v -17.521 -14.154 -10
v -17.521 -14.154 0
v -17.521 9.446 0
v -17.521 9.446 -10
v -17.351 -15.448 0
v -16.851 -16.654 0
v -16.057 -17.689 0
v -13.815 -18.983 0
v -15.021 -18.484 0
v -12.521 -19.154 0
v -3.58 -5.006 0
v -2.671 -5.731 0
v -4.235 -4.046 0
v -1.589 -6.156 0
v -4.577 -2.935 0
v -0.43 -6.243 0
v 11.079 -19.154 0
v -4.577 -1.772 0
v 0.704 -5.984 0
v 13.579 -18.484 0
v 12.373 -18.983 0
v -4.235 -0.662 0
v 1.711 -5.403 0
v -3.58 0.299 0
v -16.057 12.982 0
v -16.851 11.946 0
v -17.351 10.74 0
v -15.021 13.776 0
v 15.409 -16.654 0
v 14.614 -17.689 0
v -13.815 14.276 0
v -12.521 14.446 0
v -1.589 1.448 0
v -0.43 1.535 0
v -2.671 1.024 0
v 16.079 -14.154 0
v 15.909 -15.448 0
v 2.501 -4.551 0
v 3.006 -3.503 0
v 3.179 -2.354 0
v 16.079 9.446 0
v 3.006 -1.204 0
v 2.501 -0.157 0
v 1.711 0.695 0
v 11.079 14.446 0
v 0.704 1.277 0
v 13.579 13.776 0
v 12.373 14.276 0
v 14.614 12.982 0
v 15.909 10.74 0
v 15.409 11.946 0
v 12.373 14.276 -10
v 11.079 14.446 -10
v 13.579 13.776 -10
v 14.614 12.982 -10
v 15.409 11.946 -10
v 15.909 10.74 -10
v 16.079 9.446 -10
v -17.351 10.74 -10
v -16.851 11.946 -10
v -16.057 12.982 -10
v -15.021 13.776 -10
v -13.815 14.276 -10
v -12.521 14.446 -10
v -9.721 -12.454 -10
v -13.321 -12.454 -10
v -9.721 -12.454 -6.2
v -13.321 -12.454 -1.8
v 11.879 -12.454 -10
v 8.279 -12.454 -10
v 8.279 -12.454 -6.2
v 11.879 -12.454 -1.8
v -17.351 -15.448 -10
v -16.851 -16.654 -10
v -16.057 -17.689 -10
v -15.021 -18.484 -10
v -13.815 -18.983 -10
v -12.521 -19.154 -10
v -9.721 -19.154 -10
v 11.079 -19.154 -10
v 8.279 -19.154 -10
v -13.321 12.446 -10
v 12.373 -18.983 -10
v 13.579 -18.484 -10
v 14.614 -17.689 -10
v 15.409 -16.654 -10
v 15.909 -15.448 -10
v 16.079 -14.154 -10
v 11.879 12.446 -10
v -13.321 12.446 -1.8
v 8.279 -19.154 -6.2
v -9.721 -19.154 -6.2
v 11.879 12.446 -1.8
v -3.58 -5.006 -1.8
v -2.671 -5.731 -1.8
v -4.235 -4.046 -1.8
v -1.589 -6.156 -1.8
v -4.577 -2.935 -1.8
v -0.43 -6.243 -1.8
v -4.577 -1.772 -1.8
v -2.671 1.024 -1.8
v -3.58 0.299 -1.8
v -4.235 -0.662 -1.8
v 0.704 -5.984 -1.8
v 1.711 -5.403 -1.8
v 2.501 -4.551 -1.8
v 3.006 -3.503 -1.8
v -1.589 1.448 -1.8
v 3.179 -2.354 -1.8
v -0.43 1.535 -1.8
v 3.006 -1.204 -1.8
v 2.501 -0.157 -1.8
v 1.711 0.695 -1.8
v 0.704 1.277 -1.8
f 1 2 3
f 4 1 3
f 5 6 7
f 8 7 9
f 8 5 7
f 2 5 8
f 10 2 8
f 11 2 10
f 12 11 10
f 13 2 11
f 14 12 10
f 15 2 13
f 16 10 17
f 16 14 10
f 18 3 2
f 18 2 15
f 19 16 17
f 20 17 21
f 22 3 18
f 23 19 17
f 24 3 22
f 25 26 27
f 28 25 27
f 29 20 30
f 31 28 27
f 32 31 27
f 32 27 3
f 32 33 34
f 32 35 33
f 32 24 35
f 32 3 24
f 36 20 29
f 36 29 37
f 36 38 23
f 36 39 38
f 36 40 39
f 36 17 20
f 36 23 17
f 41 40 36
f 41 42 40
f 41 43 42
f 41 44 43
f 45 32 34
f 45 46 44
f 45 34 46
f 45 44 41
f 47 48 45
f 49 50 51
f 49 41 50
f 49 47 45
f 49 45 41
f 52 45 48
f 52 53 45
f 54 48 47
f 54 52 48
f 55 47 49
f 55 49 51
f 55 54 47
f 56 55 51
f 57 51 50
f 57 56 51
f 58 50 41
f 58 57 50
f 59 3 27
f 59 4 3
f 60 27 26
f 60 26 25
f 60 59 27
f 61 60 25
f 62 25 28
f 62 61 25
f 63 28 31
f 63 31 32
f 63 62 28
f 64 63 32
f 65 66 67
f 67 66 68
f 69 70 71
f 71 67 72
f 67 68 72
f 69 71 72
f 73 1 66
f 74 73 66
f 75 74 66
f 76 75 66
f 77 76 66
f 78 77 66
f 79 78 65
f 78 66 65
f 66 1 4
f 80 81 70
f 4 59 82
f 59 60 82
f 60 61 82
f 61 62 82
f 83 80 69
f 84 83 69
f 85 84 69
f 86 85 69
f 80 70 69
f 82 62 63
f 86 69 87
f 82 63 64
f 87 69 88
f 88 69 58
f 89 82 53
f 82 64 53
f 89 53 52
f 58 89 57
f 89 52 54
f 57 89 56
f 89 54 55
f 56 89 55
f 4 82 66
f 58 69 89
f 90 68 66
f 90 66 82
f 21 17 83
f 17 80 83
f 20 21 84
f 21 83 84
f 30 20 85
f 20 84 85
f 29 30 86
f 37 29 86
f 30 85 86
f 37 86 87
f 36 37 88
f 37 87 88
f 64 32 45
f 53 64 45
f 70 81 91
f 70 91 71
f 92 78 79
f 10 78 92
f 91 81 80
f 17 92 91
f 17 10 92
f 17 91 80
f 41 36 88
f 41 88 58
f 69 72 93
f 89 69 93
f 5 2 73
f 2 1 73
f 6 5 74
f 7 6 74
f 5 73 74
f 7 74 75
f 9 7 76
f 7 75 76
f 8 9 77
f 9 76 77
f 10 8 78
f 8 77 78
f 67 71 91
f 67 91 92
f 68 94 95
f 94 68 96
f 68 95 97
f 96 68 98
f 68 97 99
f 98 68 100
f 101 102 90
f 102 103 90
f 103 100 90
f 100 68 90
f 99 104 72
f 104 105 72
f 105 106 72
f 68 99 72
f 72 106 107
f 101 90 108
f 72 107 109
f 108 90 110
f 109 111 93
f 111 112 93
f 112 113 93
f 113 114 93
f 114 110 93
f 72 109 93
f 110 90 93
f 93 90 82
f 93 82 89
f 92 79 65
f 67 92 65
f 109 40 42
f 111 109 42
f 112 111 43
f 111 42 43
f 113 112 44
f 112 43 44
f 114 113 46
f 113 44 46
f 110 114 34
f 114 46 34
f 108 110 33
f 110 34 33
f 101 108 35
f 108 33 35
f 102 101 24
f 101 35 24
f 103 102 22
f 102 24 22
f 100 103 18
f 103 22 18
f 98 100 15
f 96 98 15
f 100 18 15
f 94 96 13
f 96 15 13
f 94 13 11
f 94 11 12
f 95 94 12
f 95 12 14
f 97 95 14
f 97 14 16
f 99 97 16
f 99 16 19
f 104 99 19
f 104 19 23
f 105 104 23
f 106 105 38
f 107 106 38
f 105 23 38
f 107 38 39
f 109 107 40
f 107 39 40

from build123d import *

# Parameters (mm, degrees)
SKETCH1_W           = 25.2
SKETCH1_H           = 24.9
SKETCH1_R           = 3.9
BOSS_EXTRUDE5_DEPTH = 1.8
SKETCH1_3_W         = 33.6
SKETCH1_3_H         = 33.6
SKETCH1_3_W_2       = 25.2
SKETCH1_3_H_2       = 24.9
BOSS_EXTRUDE6_DEPTH = 10
FILLET1_R           = 5
SKETCH3_W           = 18
SKETCH3_H           = 6.7
CUT_EXTRUDE1_DEPTH  = 3.8


with BuildPart() as part:
    # Sketch1 → Boss-Extrude5 (new body)
    with BuildSketch(Plane.XY):
        with Locations((-0.721052632, -0.003756028)):
            Rectangle(SKETCH1_W, SKETCH1_H)
        with Locations((-0.721052632, -2.353756028)):
            Circle(SKETCH1_R, mode=Mode.SUBTRACT)
    extrude(amount=-BOSS_EXTRUDE5_DEPTH)

    # Sketch1<3> → Boss-Extrude6 (add)
    with BuildSketch(Plane.XY):
        with Locations((-0.721052632, -2.353756028)):
            Rectangle(SKETCH1_3_W, SKETCH1_3_H)
        with Locations((-0.721052632, -0.003756028)):
            Rectangle(SKETCH1_3_W_2, SKETCH1_3_H_2, mode=Mode.SUBTRACT)
    extrude(amount=-BOSS_EXTRUDE6_DEPTH)

    # Fillet1
    fillet1_edges = [part.edges().sort_by_distance(p)[0] for p in [
        (16.078947368, 14.446243972, -5),
        (16.078947368, -19.153756028, -5),
        (-17.521052632, -19.153756028, -5),
        (-17.521052632, 14.446243972, -5),
    ]]
    fillet(fillet1_edges, radius=FILLET1_R)

    # Sketch3 → Cut-Extrude1 (cut)
    with BuildSketch(Plane(origin=(0, 0, -10), x_dir=(-1, 0, 0), z_dir=(0, 0, -1))):
        with Locations((0.721052632, -15.803756028)):
            Rectangle(SKETCH3_W, SKETCH3_H)
    extrude(amount=-CUT_EXTRUDE1_DEPTH, mode=Mode.SUBTRACT)


solid = part.part
